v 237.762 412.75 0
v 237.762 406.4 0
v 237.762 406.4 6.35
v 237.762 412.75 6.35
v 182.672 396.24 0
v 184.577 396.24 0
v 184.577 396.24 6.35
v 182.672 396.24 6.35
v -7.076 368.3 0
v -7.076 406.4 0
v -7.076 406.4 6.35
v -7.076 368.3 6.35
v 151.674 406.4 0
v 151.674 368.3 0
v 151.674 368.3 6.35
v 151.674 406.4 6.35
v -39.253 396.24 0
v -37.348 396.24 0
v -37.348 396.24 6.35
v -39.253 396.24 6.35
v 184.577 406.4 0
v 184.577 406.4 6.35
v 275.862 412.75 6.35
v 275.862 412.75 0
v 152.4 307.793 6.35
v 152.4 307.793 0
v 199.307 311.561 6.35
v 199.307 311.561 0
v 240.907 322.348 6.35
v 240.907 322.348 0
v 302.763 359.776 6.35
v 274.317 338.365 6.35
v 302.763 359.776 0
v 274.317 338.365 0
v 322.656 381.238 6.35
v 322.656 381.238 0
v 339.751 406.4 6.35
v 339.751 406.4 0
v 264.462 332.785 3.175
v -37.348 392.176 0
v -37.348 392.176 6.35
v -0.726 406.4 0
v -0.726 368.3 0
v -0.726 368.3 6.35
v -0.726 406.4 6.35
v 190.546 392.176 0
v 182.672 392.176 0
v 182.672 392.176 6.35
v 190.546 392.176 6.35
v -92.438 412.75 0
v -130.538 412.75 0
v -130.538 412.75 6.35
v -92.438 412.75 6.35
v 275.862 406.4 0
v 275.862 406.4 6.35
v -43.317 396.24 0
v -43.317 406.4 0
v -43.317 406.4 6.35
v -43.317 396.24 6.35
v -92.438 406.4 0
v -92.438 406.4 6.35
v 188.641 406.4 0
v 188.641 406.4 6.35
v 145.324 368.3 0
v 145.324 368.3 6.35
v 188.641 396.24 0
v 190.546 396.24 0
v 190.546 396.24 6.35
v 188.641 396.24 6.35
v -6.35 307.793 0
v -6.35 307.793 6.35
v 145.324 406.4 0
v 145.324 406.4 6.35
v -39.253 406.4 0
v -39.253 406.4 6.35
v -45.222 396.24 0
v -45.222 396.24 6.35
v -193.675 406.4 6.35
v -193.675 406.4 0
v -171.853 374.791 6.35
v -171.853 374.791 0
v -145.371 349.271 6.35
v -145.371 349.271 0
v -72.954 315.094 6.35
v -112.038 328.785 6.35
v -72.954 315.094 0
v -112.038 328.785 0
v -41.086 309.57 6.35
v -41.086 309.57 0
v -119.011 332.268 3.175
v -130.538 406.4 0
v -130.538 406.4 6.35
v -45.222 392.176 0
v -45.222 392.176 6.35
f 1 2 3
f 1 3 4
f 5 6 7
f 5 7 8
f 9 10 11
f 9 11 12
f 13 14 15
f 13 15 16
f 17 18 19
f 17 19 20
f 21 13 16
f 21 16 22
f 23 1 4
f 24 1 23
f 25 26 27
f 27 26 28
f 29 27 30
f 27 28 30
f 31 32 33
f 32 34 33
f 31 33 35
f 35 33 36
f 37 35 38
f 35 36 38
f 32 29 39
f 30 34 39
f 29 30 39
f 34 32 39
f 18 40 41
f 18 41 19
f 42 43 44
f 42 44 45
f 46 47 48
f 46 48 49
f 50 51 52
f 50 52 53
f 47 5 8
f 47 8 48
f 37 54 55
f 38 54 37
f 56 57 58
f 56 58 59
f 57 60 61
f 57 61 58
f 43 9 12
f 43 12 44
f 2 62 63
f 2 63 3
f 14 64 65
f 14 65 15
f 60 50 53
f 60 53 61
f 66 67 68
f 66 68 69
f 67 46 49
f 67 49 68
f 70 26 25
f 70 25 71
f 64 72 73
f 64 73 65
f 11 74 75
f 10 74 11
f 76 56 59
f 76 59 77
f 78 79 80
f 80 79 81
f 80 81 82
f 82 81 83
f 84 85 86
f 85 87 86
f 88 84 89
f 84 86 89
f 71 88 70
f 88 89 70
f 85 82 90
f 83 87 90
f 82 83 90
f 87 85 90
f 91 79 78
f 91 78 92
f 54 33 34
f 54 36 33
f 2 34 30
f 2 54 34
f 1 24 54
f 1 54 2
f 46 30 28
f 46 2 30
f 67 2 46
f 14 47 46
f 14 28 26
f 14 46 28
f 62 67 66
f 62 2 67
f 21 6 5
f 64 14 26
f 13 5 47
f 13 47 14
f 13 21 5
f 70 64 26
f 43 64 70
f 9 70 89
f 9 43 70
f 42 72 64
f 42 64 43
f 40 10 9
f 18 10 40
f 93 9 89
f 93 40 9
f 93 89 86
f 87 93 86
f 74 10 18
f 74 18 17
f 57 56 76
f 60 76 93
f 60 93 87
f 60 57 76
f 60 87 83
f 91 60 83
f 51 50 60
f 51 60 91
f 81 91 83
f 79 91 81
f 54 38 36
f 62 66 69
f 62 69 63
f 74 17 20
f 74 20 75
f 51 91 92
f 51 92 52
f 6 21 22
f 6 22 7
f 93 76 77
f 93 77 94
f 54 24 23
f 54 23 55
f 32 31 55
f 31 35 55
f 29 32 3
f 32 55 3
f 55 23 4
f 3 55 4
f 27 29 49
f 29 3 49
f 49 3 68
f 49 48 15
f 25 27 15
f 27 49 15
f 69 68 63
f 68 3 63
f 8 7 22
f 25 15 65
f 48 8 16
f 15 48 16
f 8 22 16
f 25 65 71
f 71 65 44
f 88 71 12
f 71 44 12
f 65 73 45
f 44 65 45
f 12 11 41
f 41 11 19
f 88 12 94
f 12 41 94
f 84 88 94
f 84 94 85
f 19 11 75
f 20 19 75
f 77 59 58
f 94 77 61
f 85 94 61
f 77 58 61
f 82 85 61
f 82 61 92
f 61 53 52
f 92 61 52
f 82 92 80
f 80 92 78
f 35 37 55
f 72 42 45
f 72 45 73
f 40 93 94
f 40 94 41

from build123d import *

# Parameters (mm, degrees)
BOSS_EXTRUDE13_DEPTH = 6.35


with BuildPart() as part:
    # Sketch1 → Boss-Extrude13 (new body)
    with BuildSketch(Plane.XY):
        with BuildLine():
            Line((-193.675, 406.4), (-130.538105188, 406.4))
            Line((-130.538105188, 406.4), (-130.538105188, 412.75))
            Line((-130.538105188, 412.75), (-92.438105188, 412.75))
            Line((-92.438105188, 412.75), (-92.438105188, 406.4))
            Line((-92.438105188, 406.4), (-43.316932521, 406.4))
            Line((-43.316932521, 406.4), (-43.316932521, 396.24))
            Line((-43.316932521, 396.24), (-45.221932521, 396.24))
            Line((-45.221932521, 396.24), (-45.221932521, 392.176))
            Line((-45.221932521, 392.176), (-37.347932521, 392.176))
            Line((-37.347932521, 392.176), (-37.347932521, 396.24))
            Line((-37.347932521, 396.24), (-39.252932521, 396.24))
            Line((-39.252932521, 396.24), (-39.252932521, 406.4))
            Line((-39.252932521, 406.4), (-7.076210377, 406.4))
            Line((-7.076210377, 406.4), (-7.076210377, 368.3))
            Line((-7.076210377, 368.3), (-6.35, 368.3))
            Line((-6.35, 368.3), (-0.726210377, 368.3))
            Line((-0.726210377, 368.3), (-0.726210377, 406.4))
            Line((-0.726210377, 406.4), (0, 406.4))
            Line((0, 406.4), (145.323789623, 406.4))
            Line((145.323789623, 406.4), (145.323789623, 368.3))
            Line((145.323789623, 368.3), (151.673789623, 368.3))
            Line((151.673789623, 368.3), (151.673789623, 406.4))
            Line((151.673789623, 406.4), (152.4, 406.4))
            Line((152.4, 406.4), (184.576722144, 406.4))
            Line((184.576722144, 406.4), (184.576722144, 396.24))
            Line((184.576722144, 396.24), (182.671722144, 396.24))
            Line((182.671722144, 396.24), (182.671722144, 392.176))
            Line((182.671722144, 392.176), (190.545722144, 392.176))
            Line((190.545722144, 392.176), (190.545722144, 396.24))
            Line((190.545722144, 396.24), (188.640722144, 396.24))
            Line((188.640722144, 396.24), (188.640722144, 406.4))
            Line((188.640722144, 406.4), (237.761894812, 406.4))
            Line((237.761894812, 406.4), (237.761894812, 412.75))
            Line((237.761894812, 412.75), (275.861894812, 412.75))
            Line((275.861894812, 412.75), (275.861894812, 406.4))
            Line((275.861894812, 406.4), (339.75144841, 406.4))
            add(Edge.make_bspline(
                [(152.4, 307.792730185), (282.8477338, 308.473912291), (339.75144841, 406.4)],
                knots=[0, 0, 0, 1, 1, 1], degree=2))
            Line((152.4, 307.792730185), (-6.35, 307.792730185))
            add(Edge.make_bspline(
                [(-193.675, 406.4), (-138.010339731, 307.440275388), (-6.35, 307.792730185)],
                knots=[0, 0, 0, 1, 1, 1], degree=2))
        make_face()
    extrude(amount=BOSS_EXTRUDE13_DEPTH)


solid = part.part
